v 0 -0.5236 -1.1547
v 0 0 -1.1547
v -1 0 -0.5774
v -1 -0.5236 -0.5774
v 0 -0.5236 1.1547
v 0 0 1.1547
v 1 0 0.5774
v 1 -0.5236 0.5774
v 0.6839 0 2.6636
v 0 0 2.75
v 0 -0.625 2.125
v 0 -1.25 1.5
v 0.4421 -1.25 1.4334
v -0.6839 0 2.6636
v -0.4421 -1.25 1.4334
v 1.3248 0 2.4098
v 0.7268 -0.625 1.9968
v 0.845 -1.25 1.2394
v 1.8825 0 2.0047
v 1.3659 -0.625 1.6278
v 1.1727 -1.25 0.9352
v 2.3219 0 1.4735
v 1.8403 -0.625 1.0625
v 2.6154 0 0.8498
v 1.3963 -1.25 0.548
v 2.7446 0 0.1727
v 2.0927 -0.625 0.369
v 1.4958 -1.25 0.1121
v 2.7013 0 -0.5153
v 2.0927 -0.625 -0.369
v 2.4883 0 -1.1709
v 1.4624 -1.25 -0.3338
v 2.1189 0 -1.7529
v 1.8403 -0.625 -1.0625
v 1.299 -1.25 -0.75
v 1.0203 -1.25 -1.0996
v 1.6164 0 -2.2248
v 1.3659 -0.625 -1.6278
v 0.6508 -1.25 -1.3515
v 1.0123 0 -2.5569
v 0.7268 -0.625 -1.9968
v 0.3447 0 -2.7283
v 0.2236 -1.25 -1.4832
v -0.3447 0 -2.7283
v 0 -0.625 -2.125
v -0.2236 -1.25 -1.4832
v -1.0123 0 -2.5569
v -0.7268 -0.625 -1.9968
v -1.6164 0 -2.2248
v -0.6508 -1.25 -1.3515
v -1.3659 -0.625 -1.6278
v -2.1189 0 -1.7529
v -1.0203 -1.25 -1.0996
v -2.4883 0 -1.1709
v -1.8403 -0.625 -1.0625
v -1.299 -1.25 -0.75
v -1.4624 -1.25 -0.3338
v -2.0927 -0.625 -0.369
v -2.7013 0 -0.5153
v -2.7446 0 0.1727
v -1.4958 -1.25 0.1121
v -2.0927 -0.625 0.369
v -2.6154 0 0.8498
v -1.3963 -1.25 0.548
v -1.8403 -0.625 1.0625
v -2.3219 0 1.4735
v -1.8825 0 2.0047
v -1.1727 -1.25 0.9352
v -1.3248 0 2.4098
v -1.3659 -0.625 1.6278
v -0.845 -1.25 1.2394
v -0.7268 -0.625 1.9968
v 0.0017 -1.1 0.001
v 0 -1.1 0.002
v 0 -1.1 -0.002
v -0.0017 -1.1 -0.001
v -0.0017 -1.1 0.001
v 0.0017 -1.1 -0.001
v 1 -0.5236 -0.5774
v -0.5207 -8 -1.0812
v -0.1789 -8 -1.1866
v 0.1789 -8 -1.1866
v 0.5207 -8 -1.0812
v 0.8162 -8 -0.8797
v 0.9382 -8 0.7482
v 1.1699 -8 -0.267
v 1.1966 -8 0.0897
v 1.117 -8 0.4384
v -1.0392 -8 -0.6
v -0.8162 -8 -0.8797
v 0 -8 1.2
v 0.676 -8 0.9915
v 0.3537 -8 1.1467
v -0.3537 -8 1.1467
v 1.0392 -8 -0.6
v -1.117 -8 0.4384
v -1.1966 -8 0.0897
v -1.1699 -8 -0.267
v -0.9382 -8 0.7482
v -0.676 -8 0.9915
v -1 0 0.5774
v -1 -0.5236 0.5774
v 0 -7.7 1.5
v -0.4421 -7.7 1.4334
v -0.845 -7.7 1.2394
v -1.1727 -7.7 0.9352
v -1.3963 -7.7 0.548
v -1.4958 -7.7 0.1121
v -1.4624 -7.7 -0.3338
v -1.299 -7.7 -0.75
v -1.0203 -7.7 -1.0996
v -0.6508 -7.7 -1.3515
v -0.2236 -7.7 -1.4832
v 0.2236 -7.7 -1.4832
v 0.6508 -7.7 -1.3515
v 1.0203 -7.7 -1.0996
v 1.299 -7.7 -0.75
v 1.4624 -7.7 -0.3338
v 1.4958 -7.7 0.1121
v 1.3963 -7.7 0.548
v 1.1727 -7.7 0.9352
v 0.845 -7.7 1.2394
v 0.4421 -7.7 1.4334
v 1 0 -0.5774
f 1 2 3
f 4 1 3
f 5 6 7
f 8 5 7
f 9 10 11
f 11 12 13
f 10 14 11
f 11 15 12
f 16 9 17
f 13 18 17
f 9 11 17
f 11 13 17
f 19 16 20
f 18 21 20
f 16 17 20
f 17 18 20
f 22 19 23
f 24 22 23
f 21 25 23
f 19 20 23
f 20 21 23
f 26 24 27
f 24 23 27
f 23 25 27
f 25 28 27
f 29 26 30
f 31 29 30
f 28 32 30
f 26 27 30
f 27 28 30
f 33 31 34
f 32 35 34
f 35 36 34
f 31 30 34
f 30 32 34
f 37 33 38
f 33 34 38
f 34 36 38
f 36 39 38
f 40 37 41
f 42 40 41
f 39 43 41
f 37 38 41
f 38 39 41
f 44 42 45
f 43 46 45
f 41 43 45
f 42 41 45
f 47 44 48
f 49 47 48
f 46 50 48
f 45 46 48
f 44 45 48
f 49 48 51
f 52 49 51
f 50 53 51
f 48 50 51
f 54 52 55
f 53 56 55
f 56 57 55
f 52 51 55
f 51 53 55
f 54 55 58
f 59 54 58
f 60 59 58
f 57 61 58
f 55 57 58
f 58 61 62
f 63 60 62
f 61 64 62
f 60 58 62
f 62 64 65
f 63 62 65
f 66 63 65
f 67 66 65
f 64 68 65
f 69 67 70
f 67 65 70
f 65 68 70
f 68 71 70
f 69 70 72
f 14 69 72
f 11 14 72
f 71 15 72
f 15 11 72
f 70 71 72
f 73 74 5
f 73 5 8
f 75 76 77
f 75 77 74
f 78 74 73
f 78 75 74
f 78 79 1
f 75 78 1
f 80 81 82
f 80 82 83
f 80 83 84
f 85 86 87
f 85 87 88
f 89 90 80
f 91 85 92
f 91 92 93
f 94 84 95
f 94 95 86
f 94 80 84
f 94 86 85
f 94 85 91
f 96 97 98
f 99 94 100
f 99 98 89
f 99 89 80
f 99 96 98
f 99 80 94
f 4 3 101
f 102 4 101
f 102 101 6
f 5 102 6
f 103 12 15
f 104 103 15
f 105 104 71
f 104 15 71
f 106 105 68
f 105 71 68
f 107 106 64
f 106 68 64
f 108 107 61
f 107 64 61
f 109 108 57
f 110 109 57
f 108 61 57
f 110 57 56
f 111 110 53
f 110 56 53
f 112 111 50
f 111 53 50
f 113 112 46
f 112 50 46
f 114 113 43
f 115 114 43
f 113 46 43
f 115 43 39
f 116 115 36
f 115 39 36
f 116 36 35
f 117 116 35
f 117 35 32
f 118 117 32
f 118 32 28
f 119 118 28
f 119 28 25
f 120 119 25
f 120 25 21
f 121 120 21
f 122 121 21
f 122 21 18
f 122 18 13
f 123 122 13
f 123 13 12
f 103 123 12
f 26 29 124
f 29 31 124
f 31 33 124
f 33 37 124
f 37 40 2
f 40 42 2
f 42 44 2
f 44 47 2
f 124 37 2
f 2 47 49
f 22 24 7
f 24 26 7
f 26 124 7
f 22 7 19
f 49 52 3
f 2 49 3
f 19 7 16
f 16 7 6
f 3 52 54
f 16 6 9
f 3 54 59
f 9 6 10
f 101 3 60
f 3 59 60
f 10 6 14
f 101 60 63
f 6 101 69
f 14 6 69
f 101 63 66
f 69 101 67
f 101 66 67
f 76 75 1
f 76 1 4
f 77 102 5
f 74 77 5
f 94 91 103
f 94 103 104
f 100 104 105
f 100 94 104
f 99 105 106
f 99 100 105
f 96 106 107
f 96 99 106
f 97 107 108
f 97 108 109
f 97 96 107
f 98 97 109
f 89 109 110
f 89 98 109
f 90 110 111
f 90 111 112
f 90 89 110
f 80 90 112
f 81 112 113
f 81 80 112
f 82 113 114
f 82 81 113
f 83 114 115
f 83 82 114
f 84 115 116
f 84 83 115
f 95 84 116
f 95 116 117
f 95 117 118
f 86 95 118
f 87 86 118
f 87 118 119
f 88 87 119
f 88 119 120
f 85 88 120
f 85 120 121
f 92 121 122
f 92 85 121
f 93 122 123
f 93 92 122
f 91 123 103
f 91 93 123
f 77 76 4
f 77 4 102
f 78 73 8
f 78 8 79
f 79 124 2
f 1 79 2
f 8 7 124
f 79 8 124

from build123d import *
from OCP.BRepFilletAPI import BRepFilletAPI_MakeChamfer

# Parameters (mm, degrees)
SKETCH_4_R          = 1.5
EXTRUDE_2_DEPTH     = 8
CUT_EXTRUDE_1_DEPTH = 1.1
CHAMFER_3_SIZE      = 0.576368876
CHAMFER_3_SIZE2     = 0.998300177
CHAMFER_4_SIZE      = 0.3


with BuildPart() as part:
    # 草图2 → 旋转1 (revolve)
    with BuildSketch(Plane.XY):
        Polygon((0, -1.86), (0, 0), (2.75, 0), (0.89, -1.86), align=None)
    revolve(axis=Axis((0, -1.86, 0), (0, 1, 0)))

    # 草图4 → 凸台-拉伸2 (add)
    with BuildSketch(Plane.XZ):
        Circle(SKETCH_4_R)
    extrude(amount=EXTRUDE_2_DEPTH)

    # 草图3 → 切除-拉伸1 (cut)
    with BuildSketch(Plane(origin=(0, 0, 0), x_dir=(1, 0, 0), z_dir=(0, 1, 0))):
        Polygon((1, 0.577350269), (0, 1.154700538), (-1, 0.577350269), (-1, -0.577350269), (0, -1.154700538), (1, -0.577350269), align=None)
    extrude(amount=-CUT_EXTRUDE_1_DEPTH, mode=Mode.SUBTRACT)

    # 倒角3: one chamfer whose edges measure the first distance from different faces: ONE call of the kernel's chamfer builder (chamfer() names one face for all edges)
    chamfer_3_edges_1 = [part.edges().sort_by_distance(p)[0] for p in [
        (-0.5, -1.1, 0.866025404),
    ]]
    chamfer_3_side_1 = [part.faces().sort_by_distance(p)[0] for p in [
        (-0.5, -0.55, 0.866025404),
    ]]
    chamfer_3_edges_2 = [part.edges().sort_by_distance(p)[0] for p in [
        (-1, -1.1, 0),
    ]]
    chamfer_3_side_2 = [part.faces().sort_by_distance(p)[0] for p in [
        (-1, -0.55, 0),
    ]]
    chamfer_3_edges_3 = [part.edges().sort_by_distance(p)[0] for p in [
        (-0.5, -1.1, -0.866025404),
    ]]
    chamfer_3_side_3 = [part.faces().sort_by_distance(p)[0] for p in [
        (-0.5, -0.55, -0.866025404),
    ]]
    chamfer_3_edges_4 = [part.edges().sort_by_distance(p)[0] for p in [
        (0.5, -1.1, -0.866025404),
    ]]
    chamfer_3_side_4 = [part.faces().sort_by_distance(p)[0] for p in [
        (0.5, -0.55, -0.866025404),
    ]]
    chamfer_3_edges_5 = [part.edges().sort_by_distance(p)[0] for p in [
        (1, -1.1, 0),
    ]]
    chamfer_3_side_5 = [part.faces().sort_by_distance(p)[0] for p in [
        (1, -0.55, 0),
    ]]
    chamfer_3_edges_6 = [part.edges().sort_by_distance(p)[0] for p in [
        (0.5, -1.1, 0.866025404),
    ]]
    chamfer_3_side_6 = [part.faces().sort_by_distance(p)[0] for p in [
        (0.5, -0.55, 0.866025404),
    ]]
    chamfer_3 = BRepFilletAPI_MakeChamfer(part.part.solid().wrapped)
    for e in chamfer_3_edges_1:
        chamfer_3.Add(CHAMFER_3_SIZE, CHAMFER_3_SIZE2, e.wrapped, chamfer_3_side_1[0].wrapped)  # the first distance lies on this face
    for e in chamfer_3_edges_2:
        chamfer_3.Add(CHAMFER_3_SIZE, CHAMFER_3_SIZE2, e.wrapped, chamfer_3_side_2[0].wrapped)  # the first distance lies on this face
    for e in chamfer_3_edges_3:
        chamfer_3.Add(CHAMFER_3_SIZE, CHAMFER_3_SIZE2, e.wrapped, chamfer_3_side_3[0].wrapped)  # the first distance lies on this face
    for e in chamfer_3_edges_4:
        chamfer_3.Add(CHAMFER_3_SIZE, CHAMFER_3_SIZE2, e.wrapped, chamfer_3_side_4[0].wrapped)  # the first distance lies on this face
    for e in chamfer_3_edges_5:
        chamfer_3.Add(CHAMFER_3_SIZE, CHAMFER_3_SIZE2, e.wrapped, chamfer_3_side_5[0].wrapped)  # the first distance lies on this face
    for e in chamfer_3_edges_6:
        chamfer_3.Add(CHAMFER_3_SIZE, CHAMFER_3_SIZE2, e.wrapped, chamfer_3_side_6[0].wrapped)  # the first distance lies on this face
    add(Compound.cast(chamfer_3.Shape()), mode=Mode.REPLACE)

    # 倒角4
    chamfer_4_edges = [part.edges().sort_by_distance(p)[0] for p in [
        (-1.5, -8, 0),
    ]]
    chamfer(chamfer_4_edges, length=CHAMFER_4_SIZE)


solid = part.part
